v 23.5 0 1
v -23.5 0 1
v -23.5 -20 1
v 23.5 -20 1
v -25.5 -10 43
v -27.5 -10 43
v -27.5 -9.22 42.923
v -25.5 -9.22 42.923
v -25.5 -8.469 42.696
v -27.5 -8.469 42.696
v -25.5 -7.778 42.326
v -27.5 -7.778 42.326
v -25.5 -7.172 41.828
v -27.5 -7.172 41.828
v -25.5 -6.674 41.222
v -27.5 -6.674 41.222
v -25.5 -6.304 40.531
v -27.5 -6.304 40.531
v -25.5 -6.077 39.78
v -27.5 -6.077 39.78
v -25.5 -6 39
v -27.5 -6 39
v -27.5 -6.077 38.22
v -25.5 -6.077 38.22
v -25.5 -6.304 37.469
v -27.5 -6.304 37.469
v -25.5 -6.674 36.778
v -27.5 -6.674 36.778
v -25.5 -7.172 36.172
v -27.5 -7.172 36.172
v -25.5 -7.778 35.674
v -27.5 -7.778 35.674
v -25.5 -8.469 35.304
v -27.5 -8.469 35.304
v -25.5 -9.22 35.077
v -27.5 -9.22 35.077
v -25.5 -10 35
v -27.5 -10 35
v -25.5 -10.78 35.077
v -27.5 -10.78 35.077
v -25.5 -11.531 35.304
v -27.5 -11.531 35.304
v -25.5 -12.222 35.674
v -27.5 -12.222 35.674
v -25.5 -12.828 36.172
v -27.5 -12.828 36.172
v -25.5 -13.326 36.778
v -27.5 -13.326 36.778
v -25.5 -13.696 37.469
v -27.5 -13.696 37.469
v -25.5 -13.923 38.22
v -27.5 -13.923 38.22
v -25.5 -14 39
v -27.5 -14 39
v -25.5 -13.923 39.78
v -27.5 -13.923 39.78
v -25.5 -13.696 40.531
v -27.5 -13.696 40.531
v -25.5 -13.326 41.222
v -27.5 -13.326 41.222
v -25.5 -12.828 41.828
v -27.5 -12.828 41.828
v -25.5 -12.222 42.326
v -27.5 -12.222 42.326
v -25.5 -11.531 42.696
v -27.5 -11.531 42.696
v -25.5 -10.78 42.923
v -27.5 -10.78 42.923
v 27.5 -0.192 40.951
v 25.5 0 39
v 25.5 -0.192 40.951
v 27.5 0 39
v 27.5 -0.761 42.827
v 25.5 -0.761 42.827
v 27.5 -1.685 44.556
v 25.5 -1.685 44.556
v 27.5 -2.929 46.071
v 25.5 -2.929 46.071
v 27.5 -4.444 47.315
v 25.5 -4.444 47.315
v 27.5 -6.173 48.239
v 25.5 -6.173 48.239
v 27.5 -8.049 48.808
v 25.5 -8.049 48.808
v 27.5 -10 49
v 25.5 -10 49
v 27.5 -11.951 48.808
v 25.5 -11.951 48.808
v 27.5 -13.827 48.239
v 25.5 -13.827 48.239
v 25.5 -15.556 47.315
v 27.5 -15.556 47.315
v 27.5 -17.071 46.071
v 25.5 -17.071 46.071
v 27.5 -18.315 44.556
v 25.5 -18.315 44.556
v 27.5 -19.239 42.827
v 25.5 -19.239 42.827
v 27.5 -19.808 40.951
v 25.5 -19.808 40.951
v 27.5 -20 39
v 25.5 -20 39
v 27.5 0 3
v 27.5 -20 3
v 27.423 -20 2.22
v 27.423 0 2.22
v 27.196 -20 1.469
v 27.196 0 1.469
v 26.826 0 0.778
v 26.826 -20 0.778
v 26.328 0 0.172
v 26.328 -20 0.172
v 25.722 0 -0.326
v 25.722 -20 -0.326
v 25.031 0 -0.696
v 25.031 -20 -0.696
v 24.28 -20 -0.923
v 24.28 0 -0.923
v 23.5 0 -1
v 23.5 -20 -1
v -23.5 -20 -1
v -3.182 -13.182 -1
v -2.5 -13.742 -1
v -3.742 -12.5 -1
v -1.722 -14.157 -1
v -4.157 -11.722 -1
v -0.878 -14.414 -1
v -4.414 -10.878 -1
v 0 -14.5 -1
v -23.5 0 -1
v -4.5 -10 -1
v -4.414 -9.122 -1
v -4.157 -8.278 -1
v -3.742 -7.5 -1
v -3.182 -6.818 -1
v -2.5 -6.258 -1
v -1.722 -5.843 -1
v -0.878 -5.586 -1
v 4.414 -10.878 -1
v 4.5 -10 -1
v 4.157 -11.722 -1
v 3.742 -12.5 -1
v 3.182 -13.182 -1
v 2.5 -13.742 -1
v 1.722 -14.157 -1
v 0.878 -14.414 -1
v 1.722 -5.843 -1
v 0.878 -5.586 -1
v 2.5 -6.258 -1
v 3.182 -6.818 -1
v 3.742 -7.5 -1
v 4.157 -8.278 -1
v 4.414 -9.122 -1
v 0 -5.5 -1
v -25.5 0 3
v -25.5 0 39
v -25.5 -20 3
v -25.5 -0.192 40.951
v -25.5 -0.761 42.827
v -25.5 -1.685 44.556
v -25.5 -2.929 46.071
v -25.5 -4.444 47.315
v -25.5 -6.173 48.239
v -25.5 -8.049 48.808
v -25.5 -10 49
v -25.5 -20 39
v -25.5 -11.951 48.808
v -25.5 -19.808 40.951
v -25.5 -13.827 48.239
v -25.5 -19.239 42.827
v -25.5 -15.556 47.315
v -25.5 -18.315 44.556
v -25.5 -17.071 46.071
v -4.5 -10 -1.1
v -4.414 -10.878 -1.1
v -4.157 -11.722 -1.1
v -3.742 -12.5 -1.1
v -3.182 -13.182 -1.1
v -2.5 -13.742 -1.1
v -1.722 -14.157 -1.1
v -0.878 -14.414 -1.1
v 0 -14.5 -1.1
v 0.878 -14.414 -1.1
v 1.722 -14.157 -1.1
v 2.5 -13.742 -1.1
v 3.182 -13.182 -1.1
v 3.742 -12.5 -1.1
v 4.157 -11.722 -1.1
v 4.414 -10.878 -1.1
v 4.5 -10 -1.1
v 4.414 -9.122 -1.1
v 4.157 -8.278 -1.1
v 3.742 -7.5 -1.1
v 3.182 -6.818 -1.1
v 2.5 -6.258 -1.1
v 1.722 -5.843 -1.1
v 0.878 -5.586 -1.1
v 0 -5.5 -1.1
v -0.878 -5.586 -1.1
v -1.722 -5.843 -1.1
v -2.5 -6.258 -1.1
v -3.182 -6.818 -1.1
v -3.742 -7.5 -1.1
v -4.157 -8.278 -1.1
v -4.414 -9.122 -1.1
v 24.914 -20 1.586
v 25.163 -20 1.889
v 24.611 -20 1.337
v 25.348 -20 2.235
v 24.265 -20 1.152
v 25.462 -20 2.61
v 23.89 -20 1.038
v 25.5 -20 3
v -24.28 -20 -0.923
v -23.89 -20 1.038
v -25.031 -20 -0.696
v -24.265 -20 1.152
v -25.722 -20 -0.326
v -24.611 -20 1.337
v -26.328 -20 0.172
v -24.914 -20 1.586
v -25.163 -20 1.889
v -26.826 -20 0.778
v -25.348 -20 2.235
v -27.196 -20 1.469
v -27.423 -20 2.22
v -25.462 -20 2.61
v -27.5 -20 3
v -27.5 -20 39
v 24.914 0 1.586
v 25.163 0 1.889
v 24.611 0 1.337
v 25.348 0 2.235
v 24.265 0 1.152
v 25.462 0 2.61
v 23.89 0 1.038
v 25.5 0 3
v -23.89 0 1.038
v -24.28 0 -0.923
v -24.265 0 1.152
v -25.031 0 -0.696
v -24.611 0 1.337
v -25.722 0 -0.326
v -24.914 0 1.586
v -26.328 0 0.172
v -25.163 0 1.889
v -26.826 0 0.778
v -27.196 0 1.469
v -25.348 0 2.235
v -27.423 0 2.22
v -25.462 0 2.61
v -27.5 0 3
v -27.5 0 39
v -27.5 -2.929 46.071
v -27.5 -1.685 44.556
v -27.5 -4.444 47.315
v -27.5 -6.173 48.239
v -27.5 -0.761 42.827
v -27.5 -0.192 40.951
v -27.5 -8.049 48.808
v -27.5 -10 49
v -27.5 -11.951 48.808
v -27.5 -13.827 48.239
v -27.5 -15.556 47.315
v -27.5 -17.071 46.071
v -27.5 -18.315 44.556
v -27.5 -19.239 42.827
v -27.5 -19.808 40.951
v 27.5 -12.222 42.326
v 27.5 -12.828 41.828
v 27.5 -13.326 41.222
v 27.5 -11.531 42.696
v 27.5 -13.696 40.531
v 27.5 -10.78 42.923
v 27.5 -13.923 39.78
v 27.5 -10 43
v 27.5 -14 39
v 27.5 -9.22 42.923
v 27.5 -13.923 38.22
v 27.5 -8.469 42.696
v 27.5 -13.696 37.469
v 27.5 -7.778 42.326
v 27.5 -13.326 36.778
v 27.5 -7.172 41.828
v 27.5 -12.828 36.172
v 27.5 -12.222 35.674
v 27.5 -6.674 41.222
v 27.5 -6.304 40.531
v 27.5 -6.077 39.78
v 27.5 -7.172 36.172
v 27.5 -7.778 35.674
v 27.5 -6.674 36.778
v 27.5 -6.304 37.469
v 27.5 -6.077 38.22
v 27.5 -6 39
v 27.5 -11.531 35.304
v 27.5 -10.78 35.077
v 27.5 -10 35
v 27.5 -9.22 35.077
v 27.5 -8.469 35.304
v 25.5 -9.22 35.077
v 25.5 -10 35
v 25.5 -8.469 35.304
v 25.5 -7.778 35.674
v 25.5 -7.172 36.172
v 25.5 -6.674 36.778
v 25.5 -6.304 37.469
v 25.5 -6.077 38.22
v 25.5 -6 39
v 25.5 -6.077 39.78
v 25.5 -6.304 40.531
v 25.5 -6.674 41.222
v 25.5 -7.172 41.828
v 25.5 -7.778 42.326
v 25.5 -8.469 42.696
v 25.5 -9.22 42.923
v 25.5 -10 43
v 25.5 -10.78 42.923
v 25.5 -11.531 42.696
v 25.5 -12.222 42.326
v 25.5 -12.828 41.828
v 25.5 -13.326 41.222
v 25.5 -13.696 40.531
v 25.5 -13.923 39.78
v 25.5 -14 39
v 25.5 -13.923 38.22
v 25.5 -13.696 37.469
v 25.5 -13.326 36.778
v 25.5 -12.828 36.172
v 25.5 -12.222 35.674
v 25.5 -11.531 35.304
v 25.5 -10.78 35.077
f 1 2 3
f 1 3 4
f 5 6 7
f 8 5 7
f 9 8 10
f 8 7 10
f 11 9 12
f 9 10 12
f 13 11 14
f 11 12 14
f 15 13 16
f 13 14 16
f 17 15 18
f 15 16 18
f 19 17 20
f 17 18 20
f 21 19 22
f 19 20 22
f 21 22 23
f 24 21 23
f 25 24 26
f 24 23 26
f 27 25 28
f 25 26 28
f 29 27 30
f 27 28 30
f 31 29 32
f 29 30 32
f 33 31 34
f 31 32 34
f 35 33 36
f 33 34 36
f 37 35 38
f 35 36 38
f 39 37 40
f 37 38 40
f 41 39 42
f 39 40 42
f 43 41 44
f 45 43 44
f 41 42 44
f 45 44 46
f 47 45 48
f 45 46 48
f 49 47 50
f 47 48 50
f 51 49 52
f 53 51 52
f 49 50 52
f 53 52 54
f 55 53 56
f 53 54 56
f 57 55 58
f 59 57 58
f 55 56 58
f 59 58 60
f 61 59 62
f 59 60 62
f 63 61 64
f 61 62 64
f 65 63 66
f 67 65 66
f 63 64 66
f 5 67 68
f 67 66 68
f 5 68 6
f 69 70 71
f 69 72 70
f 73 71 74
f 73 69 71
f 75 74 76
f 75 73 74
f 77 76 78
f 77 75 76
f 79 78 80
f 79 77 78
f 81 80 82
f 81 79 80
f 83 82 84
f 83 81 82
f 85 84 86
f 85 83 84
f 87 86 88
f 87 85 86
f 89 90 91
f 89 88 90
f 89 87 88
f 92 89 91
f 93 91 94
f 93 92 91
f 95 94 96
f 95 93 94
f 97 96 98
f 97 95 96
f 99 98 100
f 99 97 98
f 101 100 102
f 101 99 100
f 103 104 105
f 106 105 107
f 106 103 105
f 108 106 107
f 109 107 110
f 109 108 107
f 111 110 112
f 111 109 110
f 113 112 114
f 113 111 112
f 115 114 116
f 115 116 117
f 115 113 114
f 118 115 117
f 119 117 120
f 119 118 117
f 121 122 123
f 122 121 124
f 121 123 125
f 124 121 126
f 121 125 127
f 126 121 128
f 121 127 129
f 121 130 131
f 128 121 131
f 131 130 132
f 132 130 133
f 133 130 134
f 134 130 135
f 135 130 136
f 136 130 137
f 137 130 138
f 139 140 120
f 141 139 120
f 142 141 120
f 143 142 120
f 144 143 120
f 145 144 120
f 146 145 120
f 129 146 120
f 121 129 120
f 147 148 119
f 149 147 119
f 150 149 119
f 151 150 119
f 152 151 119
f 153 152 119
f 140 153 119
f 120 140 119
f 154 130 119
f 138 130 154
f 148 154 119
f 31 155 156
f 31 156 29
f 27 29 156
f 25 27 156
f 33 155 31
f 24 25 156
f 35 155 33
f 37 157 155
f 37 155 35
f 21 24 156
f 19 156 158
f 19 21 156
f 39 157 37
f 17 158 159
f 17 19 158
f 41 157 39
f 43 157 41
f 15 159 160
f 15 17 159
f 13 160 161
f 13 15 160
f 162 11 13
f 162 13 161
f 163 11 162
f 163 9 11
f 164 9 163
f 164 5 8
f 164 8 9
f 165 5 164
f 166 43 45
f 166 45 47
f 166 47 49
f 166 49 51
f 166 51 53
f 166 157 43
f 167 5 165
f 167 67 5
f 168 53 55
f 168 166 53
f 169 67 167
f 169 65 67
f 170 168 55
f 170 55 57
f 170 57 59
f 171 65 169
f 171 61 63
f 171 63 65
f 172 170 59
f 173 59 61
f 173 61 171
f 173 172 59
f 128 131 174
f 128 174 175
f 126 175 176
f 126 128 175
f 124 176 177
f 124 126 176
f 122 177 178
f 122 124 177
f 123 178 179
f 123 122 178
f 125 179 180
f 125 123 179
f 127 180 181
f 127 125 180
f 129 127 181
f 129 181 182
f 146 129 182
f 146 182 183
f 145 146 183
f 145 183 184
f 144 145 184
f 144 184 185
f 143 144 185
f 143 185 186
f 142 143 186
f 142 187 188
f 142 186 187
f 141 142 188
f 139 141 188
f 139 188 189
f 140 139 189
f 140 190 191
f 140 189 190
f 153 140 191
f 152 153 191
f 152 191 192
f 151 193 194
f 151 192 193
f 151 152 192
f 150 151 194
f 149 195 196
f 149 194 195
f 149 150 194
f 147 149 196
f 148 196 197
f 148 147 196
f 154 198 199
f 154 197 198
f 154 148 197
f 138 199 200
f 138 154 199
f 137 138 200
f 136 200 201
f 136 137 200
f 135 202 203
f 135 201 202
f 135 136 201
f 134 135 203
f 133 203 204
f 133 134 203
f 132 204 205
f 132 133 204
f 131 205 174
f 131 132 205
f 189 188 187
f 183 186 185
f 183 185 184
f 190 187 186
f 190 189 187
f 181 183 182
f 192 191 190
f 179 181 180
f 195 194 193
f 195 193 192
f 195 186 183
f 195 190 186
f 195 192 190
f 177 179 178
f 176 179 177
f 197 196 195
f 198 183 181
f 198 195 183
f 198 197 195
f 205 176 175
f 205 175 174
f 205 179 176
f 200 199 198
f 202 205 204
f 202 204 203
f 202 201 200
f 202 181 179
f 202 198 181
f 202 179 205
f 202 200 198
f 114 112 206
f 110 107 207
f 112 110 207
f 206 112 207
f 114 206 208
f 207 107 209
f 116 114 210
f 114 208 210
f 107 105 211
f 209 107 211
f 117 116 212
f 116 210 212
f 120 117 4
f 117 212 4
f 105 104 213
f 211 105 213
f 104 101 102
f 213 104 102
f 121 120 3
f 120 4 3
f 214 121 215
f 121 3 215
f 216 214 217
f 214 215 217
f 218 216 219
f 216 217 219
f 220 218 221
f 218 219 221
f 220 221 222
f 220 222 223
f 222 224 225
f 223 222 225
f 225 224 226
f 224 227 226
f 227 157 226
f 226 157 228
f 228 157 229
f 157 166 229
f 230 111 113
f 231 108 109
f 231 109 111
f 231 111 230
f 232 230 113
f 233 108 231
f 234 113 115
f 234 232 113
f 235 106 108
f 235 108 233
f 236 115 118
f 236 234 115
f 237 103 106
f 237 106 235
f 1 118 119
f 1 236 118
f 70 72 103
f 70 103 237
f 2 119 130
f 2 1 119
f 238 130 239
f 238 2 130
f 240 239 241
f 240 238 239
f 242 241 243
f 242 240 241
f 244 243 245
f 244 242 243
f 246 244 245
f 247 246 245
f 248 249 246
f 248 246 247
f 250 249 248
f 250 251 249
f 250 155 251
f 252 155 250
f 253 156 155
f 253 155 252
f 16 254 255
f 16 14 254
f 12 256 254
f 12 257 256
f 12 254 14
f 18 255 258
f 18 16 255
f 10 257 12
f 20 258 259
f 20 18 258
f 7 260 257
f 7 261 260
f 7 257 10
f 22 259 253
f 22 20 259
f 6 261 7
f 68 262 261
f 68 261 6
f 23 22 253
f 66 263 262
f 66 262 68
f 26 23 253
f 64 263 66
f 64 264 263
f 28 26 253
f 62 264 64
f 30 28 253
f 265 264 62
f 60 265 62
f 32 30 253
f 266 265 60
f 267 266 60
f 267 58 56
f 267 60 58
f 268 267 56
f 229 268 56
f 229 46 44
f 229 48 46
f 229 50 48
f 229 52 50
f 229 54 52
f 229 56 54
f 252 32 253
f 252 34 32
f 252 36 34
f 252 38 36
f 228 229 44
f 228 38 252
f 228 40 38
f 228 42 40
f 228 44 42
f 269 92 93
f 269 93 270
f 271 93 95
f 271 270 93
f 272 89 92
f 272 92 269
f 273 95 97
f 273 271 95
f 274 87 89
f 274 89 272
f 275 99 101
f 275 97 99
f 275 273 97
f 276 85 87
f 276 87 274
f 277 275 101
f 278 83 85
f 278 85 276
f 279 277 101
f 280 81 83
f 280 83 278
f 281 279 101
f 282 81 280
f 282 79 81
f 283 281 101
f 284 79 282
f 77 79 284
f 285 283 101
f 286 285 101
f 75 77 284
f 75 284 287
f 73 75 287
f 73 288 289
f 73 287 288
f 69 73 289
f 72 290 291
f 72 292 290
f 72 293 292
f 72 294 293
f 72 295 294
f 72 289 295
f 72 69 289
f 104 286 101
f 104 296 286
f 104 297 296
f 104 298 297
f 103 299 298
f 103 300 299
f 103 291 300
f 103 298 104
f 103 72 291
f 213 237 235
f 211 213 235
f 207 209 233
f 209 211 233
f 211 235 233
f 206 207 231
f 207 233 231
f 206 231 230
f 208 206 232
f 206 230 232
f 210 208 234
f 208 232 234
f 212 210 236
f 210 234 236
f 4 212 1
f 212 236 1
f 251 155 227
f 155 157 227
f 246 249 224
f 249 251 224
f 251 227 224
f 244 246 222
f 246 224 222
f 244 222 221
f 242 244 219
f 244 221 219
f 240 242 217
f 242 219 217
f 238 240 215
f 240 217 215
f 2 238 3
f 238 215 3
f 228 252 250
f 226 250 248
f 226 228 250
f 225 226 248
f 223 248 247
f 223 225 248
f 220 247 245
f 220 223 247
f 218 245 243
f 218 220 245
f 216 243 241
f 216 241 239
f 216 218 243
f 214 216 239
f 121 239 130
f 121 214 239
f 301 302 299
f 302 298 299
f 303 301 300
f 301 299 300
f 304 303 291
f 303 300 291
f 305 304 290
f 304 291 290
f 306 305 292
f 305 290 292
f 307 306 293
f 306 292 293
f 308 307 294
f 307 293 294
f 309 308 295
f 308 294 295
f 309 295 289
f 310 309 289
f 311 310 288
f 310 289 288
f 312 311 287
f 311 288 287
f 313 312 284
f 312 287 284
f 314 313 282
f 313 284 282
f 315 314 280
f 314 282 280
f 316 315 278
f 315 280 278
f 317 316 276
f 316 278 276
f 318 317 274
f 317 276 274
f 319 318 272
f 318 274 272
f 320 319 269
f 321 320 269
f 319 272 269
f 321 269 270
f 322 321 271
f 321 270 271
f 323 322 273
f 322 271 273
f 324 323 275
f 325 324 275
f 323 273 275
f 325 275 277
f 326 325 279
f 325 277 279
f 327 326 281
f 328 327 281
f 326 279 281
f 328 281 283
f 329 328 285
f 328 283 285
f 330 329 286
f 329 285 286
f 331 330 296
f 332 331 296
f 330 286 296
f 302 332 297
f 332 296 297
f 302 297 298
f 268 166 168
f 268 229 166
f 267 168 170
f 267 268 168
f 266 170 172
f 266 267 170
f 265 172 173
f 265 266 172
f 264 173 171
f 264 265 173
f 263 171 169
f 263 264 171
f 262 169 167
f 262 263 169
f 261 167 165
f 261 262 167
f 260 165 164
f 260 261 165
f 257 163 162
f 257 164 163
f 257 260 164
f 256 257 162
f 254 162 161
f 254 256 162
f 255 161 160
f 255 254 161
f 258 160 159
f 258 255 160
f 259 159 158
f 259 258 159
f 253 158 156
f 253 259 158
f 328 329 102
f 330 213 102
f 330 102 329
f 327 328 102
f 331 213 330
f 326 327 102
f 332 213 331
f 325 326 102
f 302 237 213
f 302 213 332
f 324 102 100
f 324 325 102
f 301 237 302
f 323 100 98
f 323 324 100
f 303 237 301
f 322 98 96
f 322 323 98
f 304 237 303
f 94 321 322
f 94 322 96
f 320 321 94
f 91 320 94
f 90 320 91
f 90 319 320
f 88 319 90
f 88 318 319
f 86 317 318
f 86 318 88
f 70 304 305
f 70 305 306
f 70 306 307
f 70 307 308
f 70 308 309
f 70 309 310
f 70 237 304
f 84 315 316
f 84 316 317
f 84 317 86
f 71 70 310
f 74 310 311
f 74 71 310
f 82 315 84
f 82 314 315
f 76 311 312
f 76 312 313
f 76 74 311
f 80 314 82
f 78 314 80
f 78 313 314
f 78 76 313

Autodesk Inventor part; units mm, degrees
ref_plane "YZ Plane" through (0, 0, 0) normal (1, 0, 0) x (0, 1, 0)
ref_plane "XZ Plane" through (0, 0, 0) normal (0, 1, 0) x (-1, 0, 0)
ref_plane "XY Plane" through (0, 0, 0) normal (0, 0, 1) x (1, 0, 0)
sketch "Sketch1" plane through (0, 0, 0) normal (0, 0, 1) x (1, 0, 0)
  line L0 (0, 0) -> (27.5, 0)
  line L1 (27.5, -20) -> (0, -20)
  line L2 (0, 0) -> (0, -20)
  line L3 (0, 0) -> (-27.5, 0)
  line L4 (-27.5, -20) -> (0, -20)
  line L5 (27.5, 0) -> (27.5, -20)
  line L6 (-27.5, 0) -> (-27.5, -20)
  dimension "d0" = 27.5
  dimension "d6" = 20
extrude "Extrusion1" add sketch "Sketch1" along normal mid plane 2
sketch "Sketch2" plane through (-25.5, -20, -1) normal (-1, 0, 0) x (0, -1, 0)
  line L0 (-20, 0) -> (0, 0)
  line L1 (0, 0) -> (0, 50)
  line L2 (0, 50) -> (-20, 50)
  line L3 (-20, 50) -> (-20, 0)
edge flange "Flange1" height 50 angle 90 thickness 2 bend radius 2 thickness toward (-1, 0, 0) relief tear relief width 2 relief depth 1 edges at (-27.5, -10, 1) wall of the first edge with corners at (-25.5, 0, -1) (-25.5, -20, -1) (-25.5, -20, 49) (-25.5, 0, 49)
bend "Bend1"
corner "Corner1"
sketch "Sketch3" plane through (25.5, 0, -1) normal (1, 0, 0) x (0, 1, 0)
  line L0 (-20, 0) -> (0, 0)
  line L1 (0, 0) -> (0, 50)
  line L2 (0, 50) -> (-20, 50)
  line L3 (-20, 50) -> (-20, 0)
edge flange "Flange2" height 50 angle 90 thickness 2 bend radius 2 thickness toward (1, 0, 0) relief tear relief width 2 relief depth 1 edges at (27.5, -10, 1) wall of the first edge with corners at (25.5, -20, -1) (25.5, 0, -1) (25.5, 0, 49) (25.5, -20, 49)
bend "Bend2"
corner "Corner2"
sketch "Sketch5" plane through (27.5, -20, 49) normal (1, 0, 0) x (0, 0, -1)
  line L0 (46, 0) -> (0, 0) projected
  line L1 (0, 0) -> (0, 20) projected
  line L2 (0, 20) -> (0, 0) projected
  line L3 (0, 0) -> (0, 20)
  line L4 (0, 20) -> (10, 20)
  line L5 (0, 0) -> (10, 0)
  line L6 (0, 0) -> (46, 0) projected
  arc A0 (10, 20) -> (10, 0) centre (10, 10) ccw
  line L7 (0, 20) -> (46, 20) projected
  circle A1 centre (10, 10) radius 4
  point P0 (49, 20)
  point P1 (0, 10)
  dimension "d38" = 10
  dimension "d39" = 10
  dimension "d40" = 10
  dimension "d46" = 8
extrude "Cut1" cut sketch "Sketch5" against normal blind 2
sketch "Sketch6" plane through (-27.5, -20, 49) normal (-1, 0, 0) x (0, 0, 1)
  line L0 (0, 20) -> (0, 0) projected
  line L1 (-10, 0) -> (0, 0)
  line L2 (0, 0) -> (0, 20)
  line L3 (0, 20) -> (-10, 20)
  line L4 (-46, 20) -> (0, 20) projected
  arc A0 (-10, 0) -> (-10, 20) centre (-10, 10) ccw
  circle A1 centre (-10, 10) radius 4
  point P0 (-49, 20)
  point P1 (0, 10)
  dimension "d43" = 10
  dimension "d47" = 8
extrude "Cut2" cut sketch "Sketch6" against normal blind 2
sketch "Sketch7" plane through (0, 0, -1) normal (0, 0, -1) x (-1, 0, 0)
  line L0 (23.5, 0) -> (-23.5, 0) projected
  line L1 (-23.5, -20) -> (23.5, -20) projected
  circle A0 centre (0, -10) radius 4.5
  line L2 (23.5, -20) -> (23.5, 0) projected
  line L3 (-23.5, 0) -> (-23.5, -20) projected
  point P0 (0, 0)
  dimension "d48" = 10
  dimension "d49" = 9
  dimension "d53" = 23.5
extrude "Extrusion2" add sketch "Sketch7" along normal blind 0.1 contours A0
equation "\"d41\" = Thickness"
equation "\"d44\" = Thickness"
equation "\"d7\" = Thickness"
equation "\"d8\" = BendReliefWidth"
equation "\"d9\" = BendReliefDepth"
equation "\"d10\" = MinimumRemnant"
equation "\"d11\" = TransitionRadius"
equation "\"d14\" = BendRadius"
equation "\"d15\" = CornerReliefSize"
equation "\"d16\" = GapSize"
equation "\"d17\" = JacobiRadiusSize"
equation "\"d18\" = BendReliefWidth"
equation "\"d19\" = BendReliefDepth"
equation "\"d20\" = MinimumRemnant"
equation "\"d21\" = TransitionRadius"
equation "\"d24\" = BendRadius"
equation "\"d25\" = CornerReliefSize"
equation "\"d26\" = GapSize"
equation "\"d27\" = JacobiRadiusSize"
equation "\"BendRadius\" = Thickness"
equation "\"BendReliefWidth\" = Thickness"
equation "\"BendReliefDepth\" = 0.5 * Thickness"
equation "\"CornerReliefSize\" = 4 * Thickness"
equation "\"MinimumRemnant\" = 2 * Thickness"
equation "\"TransitionRadius\" = BendRadius"
equation "\"JacobiRadiusSize\" = BendRadius"
equation "\"GapSize\" = Thickness"
equation "\"Thickness\" = 2"
properties part number "SHEET_METAL1"
